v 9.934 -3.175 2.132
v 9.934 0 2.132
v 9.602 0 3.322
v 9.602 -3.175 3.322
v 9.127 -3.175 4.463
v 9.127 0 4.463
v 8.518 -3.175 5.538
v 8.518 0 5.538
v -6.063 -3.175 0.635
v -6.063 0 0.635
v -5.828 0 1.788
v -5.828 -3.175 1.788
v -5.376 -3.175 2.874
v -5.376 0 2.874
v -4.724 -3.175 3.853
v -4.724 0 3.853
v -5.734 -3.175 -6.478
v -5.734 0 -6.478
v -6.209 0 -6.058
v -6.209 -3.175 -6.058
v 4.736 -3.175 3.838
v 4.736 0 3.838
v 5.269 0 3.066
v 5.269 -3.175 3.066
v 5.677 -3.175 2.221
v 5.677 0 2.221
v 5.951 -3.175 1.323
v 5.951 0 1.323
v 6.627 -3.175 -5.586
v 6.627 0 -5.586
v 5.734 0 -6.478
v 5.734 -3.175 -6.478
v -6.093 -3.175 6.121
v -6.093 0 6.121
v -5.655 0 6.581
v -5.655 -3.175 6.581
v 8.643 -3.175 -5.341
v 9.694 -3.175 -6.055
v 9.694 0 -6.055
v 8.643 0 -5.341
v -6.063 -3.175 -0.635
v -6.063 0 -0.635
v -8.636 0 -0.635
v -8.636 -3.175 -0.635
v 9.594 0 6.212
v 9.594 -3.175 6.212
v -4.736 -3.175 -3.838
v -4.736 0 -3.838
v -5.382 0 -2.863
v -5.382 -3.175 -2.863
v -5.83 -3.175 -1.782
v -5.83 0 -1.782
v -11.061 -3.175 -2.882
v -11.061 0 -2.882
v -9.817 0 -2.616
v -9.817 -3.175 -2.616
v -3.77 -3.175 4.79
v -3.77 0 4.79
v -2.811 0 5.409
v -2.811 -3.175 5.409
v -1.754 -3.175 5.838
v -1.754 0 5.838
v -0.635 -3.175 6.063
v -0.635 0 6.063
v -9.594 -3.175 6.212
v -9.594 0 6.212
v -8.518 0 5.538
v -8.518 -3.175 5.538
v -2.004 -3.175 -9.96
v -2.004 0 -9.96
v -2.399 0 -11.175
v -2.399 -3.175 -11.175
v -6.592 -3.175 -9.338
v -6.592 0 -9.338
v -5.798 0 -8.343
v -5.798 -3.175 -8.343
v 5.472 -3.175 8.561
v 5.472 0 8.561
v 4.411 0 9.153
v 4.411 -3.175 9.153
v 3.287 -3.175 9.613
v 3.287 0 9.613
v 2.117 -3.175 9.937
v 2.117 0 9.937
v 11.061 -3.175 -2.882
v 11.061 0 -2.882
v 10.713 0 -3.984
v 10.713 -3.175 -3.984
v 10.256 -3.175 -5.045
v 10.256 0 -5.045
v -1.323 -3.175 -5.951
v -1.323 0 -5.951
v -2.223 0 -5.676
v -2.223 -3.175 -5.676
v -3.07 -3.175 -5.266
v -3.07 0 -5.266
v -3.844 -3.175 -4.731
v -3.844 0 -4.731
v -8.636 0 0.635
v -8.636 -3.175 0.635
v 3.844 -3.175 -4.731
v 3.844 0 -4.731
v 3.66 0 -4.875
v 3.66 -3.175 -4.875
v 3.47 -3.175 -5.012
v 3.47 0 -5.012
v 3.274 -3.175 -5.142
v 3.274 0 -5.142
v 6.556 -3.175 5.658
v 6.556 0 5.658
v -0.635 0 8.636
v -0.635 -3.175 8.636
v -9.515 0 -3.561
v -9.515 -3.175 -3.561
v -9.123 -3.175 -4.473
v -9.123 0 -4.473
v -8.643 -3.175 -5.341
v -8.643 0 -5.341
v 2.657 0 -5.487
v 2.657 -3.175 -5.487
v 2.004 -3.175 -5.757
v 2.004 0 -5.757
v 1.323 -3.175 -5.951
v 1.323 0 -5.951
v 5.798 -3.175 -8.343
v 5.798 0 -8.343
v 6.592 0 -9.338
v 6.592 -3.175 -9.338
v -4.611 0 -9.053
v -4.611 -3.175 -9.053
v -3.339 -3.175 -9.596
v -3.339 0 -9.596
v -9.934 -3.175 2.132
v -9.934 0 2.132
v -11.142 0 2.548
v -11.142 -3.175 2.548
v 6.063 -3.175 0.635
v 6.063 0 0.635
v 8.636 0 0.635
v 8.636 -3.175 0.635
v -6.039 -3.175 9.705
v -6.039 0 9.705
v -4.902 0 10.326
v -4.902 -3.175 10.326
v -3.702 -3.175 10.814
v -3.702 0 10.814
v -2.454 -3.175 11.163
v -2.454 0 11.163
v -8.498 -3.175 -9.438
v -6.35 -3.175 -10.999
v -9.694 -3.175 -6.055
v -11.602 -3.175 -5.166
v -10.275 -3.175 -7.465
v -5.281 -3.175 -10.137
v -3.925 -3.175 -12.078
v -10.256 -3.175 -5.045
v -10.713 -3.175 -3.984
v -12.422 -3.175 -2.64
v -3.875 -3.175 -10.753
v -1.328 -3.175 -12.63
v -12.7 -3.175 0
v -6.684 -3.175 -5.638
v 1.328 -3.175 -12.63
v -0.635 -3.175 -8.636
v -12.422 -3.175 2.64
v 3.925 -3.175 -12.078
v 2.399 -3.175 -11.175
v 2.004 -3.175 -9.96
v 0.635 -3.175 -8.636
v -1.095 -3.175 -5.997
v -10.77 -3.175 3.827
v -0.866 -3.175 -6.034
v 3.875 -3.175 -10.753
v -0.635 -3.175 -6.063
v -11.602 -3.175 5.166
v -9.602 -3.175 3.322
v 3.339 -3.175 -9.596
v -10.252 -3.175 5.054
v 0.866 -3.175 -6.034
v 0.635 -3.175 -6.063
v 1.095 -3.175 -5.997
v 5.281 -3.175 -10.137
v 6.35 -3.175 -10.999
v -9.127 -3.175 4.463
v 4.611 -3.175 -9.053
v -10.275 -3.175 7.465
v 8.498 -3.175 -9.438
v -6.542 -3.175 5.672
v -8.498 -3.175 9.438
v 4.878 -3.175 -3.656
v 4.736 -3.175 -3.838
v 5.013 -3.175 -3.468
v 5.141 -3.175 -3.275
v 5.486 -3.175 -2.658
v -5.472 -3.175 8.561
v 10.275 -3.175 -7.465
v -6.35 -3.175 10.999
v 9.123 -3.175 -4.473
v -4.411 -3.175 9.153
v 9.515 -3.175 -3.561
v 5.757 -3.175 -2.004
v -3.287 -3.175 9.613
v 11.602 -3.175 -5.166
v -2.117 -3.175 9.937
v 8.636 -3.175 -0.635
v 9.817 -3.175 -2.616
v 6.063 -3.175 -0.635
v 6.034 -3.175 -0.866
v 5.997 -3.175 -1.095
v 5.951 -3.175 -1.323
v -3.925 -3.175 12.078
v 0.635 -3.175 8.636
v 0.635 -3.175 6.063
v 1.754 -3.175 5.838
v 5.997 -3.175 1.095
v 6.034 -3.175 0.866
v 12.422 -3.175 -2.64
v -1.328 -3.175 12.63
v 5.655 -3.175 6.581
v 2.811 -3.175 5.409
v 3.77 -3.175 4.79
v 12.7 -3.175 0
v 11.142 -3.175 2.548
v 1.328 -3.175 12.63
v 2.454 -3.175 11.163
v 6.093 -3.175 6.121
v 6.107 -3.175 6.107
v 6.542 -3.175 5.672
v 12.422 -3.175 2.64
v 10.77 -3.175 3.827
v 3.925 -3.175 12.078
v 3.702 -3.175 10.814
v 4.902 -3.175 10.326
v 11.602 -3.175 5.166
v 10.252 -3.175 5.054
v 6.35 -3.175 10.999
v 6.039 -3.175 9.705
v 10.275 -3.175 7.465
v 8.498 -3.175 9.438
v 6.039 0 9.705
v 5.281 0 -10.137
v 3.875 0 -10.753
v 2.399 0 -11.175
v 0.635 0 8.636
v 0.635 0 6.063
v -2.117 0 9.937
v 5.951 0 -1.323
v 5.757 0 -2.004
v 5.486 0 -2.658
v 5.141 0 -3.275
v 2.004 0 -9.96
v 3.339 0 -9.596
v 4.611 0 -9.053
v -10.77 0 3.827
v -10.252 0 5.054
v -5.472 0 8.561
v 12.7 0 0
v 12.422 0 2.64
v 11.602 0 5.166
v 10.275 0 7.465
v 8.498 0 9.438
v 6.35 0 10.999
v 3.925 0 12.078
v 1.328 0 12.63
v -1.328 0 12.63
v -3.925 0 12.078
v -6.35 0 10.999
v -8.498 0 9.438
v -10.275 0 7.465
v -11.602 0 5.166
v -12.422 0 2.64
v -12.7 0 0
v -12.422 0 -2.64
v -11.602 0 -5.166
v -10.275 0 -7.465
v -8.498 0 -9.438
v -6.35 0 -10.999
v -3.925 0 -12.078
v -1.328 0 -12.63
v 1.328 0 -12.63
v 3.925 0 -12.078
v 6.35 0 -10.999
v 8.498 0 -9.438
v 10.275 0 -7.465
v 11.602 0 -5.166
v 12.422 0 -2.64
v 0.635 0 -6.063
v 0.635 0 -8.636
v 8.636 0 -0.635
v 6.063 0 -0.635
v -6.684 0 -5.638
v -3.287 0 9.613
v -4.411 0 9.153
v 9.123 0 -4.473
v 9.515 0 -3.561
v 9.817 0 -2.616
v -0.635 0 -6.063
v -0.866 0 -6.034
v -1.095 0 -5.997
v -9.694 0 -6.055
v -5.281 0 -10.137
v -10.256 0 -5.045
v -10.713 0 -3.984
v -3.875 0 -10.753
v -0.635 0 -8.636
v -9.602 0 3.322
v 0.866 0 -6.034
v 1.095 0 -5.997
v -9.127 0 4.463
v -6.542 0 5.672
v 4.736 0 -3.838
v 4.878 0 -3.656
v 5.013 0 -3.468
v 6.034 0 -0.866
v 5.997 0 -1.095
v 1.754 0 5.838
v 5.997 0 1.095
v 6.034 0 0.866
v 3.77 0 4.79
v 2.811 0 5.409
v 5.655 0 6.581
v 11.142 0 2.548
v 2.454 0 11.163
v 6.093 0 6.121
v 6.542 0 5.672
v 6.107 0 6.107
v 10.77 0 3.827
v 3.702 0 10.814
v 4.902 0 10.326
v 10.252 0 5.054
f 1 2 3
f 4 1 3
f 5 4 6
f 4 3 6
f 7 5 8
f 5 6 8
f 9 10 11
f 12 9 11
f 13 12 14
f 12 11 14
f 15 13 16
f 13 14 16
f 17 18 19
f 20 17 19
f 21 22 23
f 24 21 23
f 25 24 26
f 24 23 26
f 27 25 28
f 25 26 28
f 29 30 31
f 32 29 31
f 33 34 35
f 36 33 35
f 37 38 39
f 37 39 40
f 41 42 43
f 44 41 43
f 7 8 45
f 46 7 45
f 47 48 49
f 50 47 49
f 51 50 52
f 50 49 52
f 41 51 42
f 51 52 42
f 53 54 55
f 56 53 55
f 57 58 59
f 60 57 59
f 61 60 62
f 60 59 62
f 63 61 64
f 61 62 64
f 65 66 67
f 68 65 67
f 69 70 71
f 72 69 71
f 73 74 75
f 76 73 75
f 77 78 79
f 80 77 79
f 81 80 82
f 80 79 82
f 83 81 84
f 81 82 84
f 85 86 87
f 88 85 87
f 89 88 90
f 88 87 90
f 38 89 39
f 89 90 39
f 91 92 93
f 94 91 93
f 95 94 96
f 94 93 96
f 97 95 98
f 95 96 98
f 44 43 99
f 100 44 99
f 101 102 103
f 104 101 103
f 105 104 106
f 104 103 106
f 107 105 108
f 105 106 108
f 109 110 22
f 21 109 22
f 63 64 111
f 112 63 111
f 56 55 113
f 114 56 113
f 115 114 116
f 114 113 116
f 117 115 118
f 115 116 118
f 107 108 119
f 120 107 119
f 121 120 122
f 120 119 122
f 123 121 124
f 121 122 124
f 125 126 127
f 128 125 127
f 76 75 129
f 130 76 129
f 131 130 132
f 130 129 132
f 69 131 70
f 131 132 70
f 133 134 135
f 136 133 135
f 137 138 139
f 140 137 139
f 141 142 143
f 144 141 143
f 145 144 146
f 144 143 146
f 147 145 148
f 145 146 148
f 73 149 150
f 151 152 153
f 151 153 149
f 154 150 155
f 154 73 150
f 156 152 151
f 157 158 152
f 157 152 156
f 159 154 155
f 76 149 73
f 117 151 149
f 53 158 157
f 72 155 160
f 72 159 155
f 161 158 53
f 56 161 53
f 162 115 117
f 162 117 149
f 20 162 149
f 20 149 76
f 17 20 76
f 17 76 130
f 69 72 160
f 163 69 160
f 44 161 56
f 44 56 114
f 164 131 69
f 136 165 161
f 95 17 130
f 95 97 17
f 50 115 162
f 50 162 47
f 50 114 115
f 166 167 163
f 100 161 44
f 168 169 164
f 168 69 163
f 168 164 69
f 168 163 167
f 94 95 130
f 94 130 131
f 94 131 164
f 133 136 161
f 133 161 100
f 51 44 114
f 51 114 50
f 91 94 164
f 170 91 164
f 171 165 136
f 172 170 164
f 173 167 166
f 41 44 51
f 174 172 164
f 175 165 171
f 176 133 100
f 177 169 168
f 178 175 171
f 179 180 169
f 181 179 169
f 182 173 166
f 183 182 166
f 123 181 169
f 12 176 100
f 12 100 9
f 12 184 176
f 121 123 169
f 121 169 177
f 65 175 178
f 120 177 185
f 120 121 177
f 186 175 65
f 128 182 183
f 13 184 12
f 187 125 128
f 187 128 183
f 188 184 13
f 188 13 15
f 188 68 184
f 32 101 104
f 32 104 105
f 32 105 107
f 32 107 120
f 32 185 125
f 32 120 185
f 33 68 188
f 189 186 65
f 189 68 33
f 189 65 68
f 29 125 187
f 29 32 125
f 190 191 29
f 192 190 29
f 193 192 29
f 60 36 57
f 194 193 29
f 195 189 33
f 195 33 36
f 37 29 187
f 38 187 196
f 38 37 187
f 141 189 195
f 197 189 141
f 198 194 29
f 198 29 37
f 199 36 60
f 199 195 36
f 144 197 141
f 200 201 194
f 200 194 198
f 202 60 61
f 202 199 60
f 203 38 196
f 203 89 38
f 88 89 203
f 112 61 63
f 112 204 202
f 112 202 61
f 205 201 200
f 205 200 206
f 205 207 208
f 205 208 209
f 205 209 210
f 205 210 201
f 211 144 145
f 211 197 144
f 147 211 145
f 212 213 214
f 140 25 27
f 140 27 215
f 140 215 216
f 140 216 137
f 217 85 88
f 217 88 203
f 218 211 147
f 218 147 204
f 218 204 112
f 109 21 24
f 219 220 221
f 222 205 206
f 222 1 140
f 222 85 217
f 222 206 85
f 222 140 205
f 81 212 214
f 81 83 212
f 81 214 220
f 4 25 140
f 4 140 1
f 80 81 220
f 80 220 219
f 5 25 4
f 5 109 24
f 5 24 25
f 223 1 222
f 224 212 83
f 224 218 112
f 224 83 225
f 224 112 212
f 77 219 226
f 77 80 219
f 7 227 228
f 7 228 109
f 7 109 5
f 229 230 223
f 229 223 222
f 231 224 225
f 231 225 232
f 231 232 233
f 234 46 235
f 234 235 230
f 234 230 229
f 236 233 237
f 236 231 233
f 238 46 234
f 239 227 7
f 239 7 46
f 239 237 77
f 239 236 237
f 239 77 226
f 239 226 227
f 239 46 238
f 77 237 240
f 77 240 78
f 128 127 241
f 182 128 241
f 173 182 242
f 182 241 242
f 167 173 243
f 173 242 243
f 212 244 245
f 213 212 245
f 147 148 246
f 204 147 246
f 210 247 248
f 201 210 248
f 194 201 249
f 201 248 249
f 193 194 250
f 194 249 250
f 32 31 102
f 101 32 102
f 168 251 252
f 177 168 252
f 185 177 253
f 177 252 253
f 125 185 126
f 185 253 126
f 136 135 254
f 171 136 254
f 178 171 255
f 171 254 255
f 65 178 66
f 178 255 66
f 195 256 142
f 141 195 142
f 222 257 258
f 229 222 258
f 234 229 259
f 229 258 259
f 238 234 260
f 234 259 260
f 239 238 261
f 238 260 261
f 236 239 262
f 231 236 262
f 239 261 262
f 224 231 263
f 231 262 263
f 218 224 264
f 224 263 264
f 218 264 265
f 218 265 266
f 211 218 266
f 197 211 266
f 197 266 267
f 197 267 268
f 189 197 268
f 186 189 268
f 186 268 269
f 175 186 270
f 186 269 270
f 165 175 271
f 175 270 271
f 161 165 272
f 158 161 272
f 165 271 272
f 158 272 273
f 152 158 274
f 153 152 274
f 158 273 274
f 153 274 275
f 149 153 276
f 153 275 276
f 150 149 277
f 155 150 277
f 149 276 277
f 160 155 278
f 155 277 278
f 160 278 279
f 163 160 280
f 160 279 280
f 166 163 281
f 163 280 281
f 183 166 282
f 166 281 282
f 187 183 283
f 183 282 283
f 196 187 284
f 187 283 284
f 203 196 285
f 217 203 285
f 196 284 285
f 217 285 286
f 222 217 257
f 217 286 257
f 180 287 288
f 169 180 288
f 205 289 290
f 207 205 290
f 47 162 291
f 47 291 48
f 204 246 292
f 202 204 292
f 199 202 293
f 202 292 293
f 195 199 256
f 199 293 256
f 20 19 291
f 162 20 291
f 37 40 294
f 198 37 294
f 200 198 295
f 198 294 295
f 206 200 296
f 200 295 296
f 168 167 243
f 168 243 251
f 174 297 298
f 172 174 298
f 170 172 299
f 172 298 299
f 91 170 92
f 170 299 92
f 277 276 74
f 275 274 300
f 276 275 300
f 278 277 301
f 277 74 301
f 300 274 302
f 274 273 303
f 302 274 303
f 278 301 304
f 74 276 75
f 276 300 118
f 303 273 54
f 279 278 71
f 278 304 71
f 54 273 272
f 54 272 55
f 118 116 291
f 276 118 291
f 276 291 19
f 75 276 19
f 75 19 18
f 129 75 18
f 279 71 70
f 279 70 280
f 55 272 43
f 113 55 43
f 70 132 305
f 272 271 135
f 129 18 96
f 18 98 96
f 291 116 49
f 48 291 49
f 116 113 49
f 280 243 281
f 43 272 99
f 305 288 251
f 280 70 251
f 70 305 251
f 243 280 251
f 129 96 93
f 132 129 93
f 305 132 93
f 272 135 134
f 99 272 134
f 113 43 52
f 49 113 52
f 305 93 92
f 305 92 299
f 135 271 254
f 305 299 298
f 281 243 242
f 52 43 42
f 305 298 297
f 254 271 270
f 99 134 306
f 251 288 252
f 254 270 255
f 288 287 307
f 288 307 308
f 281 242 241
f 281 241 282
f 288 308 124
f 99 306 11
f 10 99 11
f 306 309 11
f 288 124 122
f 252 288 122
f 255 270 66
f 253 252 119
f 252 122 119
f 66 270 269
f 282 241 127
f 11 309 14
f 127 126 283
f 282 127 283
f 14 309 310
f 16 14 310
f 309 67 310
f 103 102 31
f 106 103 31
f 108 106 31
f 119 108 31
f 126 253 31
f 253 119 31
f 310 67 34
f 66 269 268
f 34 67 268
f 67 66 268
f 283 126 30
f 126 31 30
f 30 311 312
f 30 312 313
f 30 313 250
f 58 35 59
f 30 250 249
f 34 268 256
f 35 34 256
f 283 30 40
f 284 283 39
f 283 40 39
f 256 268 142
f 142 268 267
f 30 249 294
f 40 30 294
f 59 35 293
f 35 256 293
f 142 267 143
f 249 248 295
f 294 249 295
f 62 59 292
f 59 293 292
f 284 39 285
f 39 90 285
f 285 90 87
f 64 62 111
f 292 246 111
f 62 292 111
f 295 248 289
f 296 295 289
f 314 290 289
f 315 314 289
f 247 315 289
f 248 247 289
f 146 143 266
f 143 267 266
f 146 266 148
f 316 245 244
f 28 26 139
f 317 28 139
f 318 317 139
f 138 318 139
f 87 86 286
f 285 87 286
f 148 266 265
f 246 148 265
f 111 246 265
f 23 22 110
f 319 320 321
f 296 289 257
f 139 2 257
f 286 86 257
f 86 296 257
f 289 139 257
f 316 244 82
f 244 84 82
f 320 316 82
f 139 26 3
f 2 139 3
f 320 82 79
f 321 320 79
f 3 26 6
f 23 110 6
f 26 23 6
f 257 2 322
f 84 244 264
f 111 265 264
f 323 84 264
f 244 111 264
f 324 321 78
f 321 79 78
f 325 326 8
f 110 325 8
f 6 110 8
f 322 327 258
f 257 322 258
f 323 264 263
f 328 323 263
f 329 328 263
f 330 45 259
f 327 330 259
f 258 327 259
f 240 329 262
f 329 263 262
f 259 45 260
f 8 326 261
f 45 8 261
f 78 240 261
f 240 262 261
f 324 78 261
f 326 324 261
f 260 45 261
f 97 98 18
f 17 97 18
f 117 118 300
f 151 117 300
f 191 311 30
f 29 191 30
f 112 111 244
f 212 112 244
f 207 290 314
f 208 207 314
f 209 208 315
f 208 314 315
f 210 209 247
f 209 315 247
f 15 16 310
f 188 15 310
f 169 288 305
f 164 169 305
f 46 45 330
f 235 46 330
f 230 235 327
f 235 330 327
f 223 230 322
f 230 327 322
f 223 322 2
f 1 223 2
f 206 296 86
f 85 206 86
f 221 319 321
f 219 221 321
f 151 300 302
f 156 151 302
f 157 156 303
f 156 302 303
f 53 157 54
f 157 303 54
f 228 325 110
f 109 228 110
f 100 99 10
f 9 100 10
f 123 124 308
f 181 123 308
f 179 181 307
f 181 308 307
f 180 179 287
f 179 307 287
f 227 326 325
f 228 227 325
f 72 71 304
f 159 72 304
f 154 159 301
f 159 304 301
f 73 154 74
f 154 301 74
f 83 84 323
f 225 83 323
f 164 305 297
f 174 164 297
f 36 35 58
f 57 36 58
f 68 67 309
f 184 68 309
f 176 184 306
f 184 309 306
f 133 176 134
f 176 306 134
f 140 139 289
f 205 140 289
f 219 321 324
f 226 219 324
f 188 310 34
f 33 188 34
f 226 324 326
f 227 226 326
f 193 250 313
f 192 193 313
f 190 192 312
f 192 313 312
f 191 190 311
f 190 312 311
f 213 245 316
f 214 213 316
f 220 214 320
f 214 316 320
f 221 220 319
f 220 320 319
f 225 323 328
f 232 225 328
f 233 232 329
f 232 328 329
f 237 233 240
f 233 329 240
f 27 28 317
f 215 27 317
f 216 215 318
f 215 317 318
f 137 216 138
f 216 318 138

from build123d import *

# Parameters (mm, degrees)
F0_R     = 12.7
F1_DEPTH = 3.175


# Not quite as in the source:
# - ends of sketch curves that miss each other by under 0.0002 mm in the source are joined


with BuildPart() as f1:
    # F0 (on Front) → F1 (new body)
    with BuildSketch(Plane.XZ):
        Circle(F0_R)
        with BuildLine():
            ThreePointArc((11.1424209807, 2.5478137078), (11.3578777025, 1.2819961371), (11.43, 0))
            ThreePointArc((11.43, 0), (11.3372924765, -1.4528245947), (11.0606737878, -2.8820817755))
            ThreePointArc((11.0606737878, -2.8820817755), (10.498054115, -4.5205928591), (9.694266327, -6.0552539485))
            ThreePointArc((9.694266327, -6.0552539485), (8.3067678362, -7.8512742988), (6.5917644701, -9.3377481852))
            ThreePointArc((6.5917644701, -9.3377481852), (4.5881966593, -10.4686843212), (2.3987302505, -11.1754638913))
            ThreePointArc((2.3987302505, -11.1754638913), (0, -11.43), (-2.3987302505, -11.1754638913))
            ThreePointArc((-2.3987302505, -11.1754638913), (-4.5881966593, -10.4686843212), (-6.5917644701, -9.3377481852))
            ThreePointArc((-6.5917644701, -9.3377481852), (-8.3067678362, -7.8512742988), (-9.694266327, -6.0552539485))
            ThreePointArc((-9.694266327, -6.0552539485), (-10.498054115, -4.5205928591), (-11.0606737878, -2.8820817755))
            ThreePointArc((-11.0606737878, -2.8820817755), (-11.4287048944, -0.1720593972), (-11.1424209807, 2.5478137078))
            ThreePointArc((-11.1424209807, 2.5478137078), (-10.5290706386, 4.4478726922), (-9.5944423354, 6.2122118663))
            ThreePointArc((-9.5944423354, 6.2122118663), (-8.0092161617, 8.1545911286), (-6.0386388222, 9.7046247313))
            ThreePointArc((-6.0386388222, 9.7046247313), (-4.3084616277, 10.5868814295), (-2.4538934823, 11.1634809436))
            ThreePointArc((-2.4538934823, 11.1634809436), (0, 11.43), (2.4538934823, 11.1634809436))
            ThreePointArc((2.4538934823, 11.1634809436), (4.3084616277, 10.5868814295), (6.0386388222, 9.7046247313))
            ThreePointArc((6.0386388222, 9.7046247313), (8.0092161617, 8.1545911286), (9.5944423354, 6.2122118663))
            ThreePointArc((9.5944423354, 6.2122118663), (10.5290706386, 4.4478726922), (11.1424209807, 2.5478137078))
        make_face(mode=Mode.SUBTRACT)
        with BuildLine():
            ThreePointArc((10.16, 0), (10.10329164, 1.0719599045), (9.933799599, 2.1319534531))
            ThreePointArc((9.933799599, 2.1319534531), (9.3818599064, 3.8995262145), (8.5182733268, 5.5375644041))
            ThreePointArc((8.5182733268, 5.5375644041), (7.1564472405, 7.2118557178), (5.4717026611, 8.5607283562))
            ThreePointArc((5.4717026611, 8.5607283562), (3.8560932614, 9.3997949318), (2.1166776906, 9.9370657417))
            ThreePointArc((2.1166776906, 9.9370657417), (0, 10.16), (-2.1166776906, 9.9370657417))
            ThreePointArc((-2.1166776906, 9.9370657417), (-3.8560932614, 9.3997949318), (-5.4717026611, 8.5607283562))
            ThreePointArc((-5.4717026611, 8.5607283562), (-7.1564472405, 7.2118557178), (-8.5182733268, 5.5375644041))
            ThreePointArc((-8.5182733268, 5.5375644041), (-9.3818599064, 3.8995262145), (-9.933799599, 2.1319534531))
            ThreePointArc((-9.933799599, 2.1319534531), (-10.1569477884, -0.2490213305), (-9.817387512, -2.6162))
            ThreePointArc((-9.817387512, -2.6162), (-9.3301072422, -4.0217780707), (-8.6427953563, -5.3411317555))
            ThreePointArc((-8.6427953563, -5.3411317555), (-7.3747174058, -6.9885007824), (-5.7978750028, -8.343275463))
            ThreePointArc((-5.7978750028, -8.343275463), (-3.9840291181, -9.3462886744), (-2.0043747759, -9.9603253841))
            ThreePointArc((-2.0043747759, -9.9603253841), (0, -10.16), (2.0043747759, -9.9603253841))
            ThreePointArc((2.0043747759, -9.9603253841), (3.9840291181, -9.3462886744), (5.7978750028, -8.343275463))
            ThreePointArc((5.7978750028, -8.343275463), (7.3747174058, -6.9885007824), (8.6427953563, -5.3411317555))
            ThreePointArc((8.6427953563, -5.3411317555), (9.3301072422, -4.0217780707), (9.817387512, -2.6162))
            ThreePointArc((9.817387512, -2.6162), (10.0739827556, -1.3192692823), (10.16, 0))
        make_face()
        with BuildLine():
            ThreePointArc((4.7360858752, 3.8380602631), (5.4892872515, 2.6512150932), (5.9506155559, 1.323401113))
            Line((5.9506155559, 1.323401113), (8.636, 1.323401113))
            Line((8.636, 1.323401113), (8.636, 0.635))
            Line((8.636, 0.635), (8.636, 0))
            Line((8.636, 0), (8.636, -0.635))
            Line((8.636, -0.635), (8.636, -1.323401113))
            Line((8.636, -1.323401113), (5.9506155559, -1.323401113))
            ThreePointArc((5.9506155559, -1.323401113), (5.6312135784, -2.3346626382), (5.1413854537, -3.2752666482))
            Line((5.1413854537, -3.2752666482), (7.0945855376, -5.080295188))
            Line((7.0945855376, -5.080295188), (6.6273668913, -5.5858669721))
            Line((6.6273668913, -5.5858669721), (5.7343752763, -6.4777944262))
            Line((5.7343752763, -6.4777944262), (5.2671687856, -6.9833774435))
            Line((5.2671687856, -6.9833774435), (3.2744427263, -5.1419102319))
            ThreePointArc((3.2744427263, -5.1419102319), (2.3342114446, -5.631400619), (1.323401113, -5.9506155559))
            Line((1.323401113, -5.9506155559), (1.323401113, -8.636))
            Line((1.323401113, -8.636), (0.635, -8.636))
            Line((0.635, -8.636), (0, -8.636))
            Line((0, -8.636), (-0.635, -8.636))
            Line((-0.635, -8.636), (-1.323401113, -8.636))
            Line((-1.323401113, -8.636), (-1.323401113, -5.9506155559))
            ThreePointArc((-1.323401113, -5.9506155559), (-2.6547777921, -5.4875651135), (-3.8442056919, -4.7310990899))
            Line((-3.8442056919, -4.7310990899), (-5.7343752763, -6.4777944262))
            Line((-5.7343752763, -6.4777944262), (-6.2091766623, -6.0579455764))
            Line((-6.2091766623, -6.0579455764), (-6.6839780483, -5.6380967267))
            Line((-6.6839780483, -5.6380967267), (-4.7360858752, -3.8380602631))
            ThreePointArc((-4.7360858752, -3.8380602631), (-5.6319696302, -2.3328382037), (-6.0628368772, -0.635))
            Line((-6.0628368772, -0.635), (-8.636, -0.635))
            Line((-8.636, -0.635), (-8.636, 0))
            Line((-8.636, 0), (-8.636, 0.635))
            Line((-8.636, 0.635), (-6.0628368772, 0.635))
            ThreePointArc((-6.0628368772, 0.635), (-5.6281633501, 2.3420062564), (-4.7235609165, 3.8534644501))
            Line((-4.7235609165, 3.8534644501), (-6.5416064283, 5.671509962))
            Line((-6.5416064283, 5.671509962), (-6.0925936223, 6.120522768))
            Line((-6.0925936223, 6.120522768), (-5.6552171182, 6.5808778416))
            Line((-5.6552171182, 6.5808778416), (-3.7703908438, 4.7901324496))
            ThreePointArc((-3.7703908438, 4.7901324496), (-2.2927737049, 5.6483984224), (-0.635, 6.0628368772))
            Line((-0.635, 6.0628368772), (-0.635, 8.636))
            Line((-0.635, 8.636), (0, 8.636))
            Line((0, 8.636), (0.635, 8.636))
            Line((0.635, 8.636), (0.635, 6.0628368772))
            ThreePointArc((0.635, 6.0628368772), (2.2927737049, 5.6483984224), (3.7703908438, 4.7901324496))
            Line((3.7703908438, 4.7901324496), (5.6552171182, 6.5808778416))
            Line((5.6552171182, 6.5808778416), (6.0925936223, 6.120522768))
            Line((6.0925936223, 6.120522768), (6.1065741623, 6.1065741623))
            Line((6.1065741623, 6.1065741623), (6.5416223955, 5.6715259292))
            Line((6.5416223955, 5.6715259292), (6.5555869684, 5.6575613563))
            Line((6.5555869684, 5.6575613563), (4.7360858752, 3.8380602631))
        make_face(mode=Mode.SUBTRACT)
        with BuildLine():
            ThreePointArc((11.0606737878, -2.8820817755), (11.3372924765, -1.4528245947), (11.43, 0))
            ThreePointArc((11.43, 0), (11.3578777025, 1.2819961371), (11.1424209807, 2.5478137078))
            Line((11.1424209807, 2.5478137078), (9.933799599, 2.1319534531))
            ThreePointArc((9.933799599, 2.1319534531), (10.10329164, 1.0719599045), (10.16, 0))
            ThreePointArc((10.16, 0), (10.0739827556, -1.3192692823), (9.817387512, -2.6162))
            Line((9.817387512, -2.6162), (11.0606737878, -2.8820817755))
        make_face()
        with BuildLine():
            Line((-9.933799599, 2.1319534531), (-11.1424209807, 2.5478137078))
            ThreePointArc((-11.1424209807, 2.5478137078), (-11.4287048944, -0.1720593972), (-11.0606737878, -2.8820817755))
            Line((-11.0606737878, -2.8820817755), (-9.817387512, -2.6162))
            ThreePointArc((-9.817387512, -2.6162), (-10.1569477884, -0.2490213305), (-9.933799599, 2.1319534531))
        make_face()
        with BuildLine():
            Line((-5.4717026611, 8.5607283562), (-6.0386388222, 9.7046247313))
            ThreePointArc((-6.0386388222, 9.7046247313), (-8.0092161617, 8.1545911286), (-9.5944423354, 6.2122118663))
            Line((-9.5944423354, 6.2122118663), (-8.5182733268, 5.5375644041))
            ThreePointArc((-8.5182733268, 5.5375644041), (-7.1564472405, 7.2118557178), (-5.4717026611, 8.5607283562))
        make_face()
        with BuildLine():
            Line((8.5182733268, 5.5375644041), (9.5944423354, 6.2122118663))
            ThreePointArc((9.5944423354, 6.2122118663), (8.0092161617, 8.1545911286), (6.0386388222, 9.7046247313))
            Line((6.0386388222, 9.7046247313), (5.4717026611, 8.5607283562))
            ThreePointArc((5.4717026611, 8.5607283562), (7.1564472405, 7.2118557178), (8.5182733268, 5.5375644041))
        make_face()
        with BuildLine():
            Line((2.1166776906, 9.9370657417), (2.4538934823, 11.1634809436))
            ThreePointArc((2.4538934823, 11.1634809436), (0, 11.43), (-2.4538934823, 11.1634809436))
            Line((-2.4538934823, 11.1634809436), (-2.1166776906, 9.9370657417))
            ThreePointArc((-2.1166776906, 9.9370657417), (0, 10.16), (2.1166776906, 9.9370657417))
        make_face()
        with BuildLine():
            ThreePointArc((-2.3987302505, -11.1754638913), (0, -11.43), (2.3987302505, -11.1754638913))
            Line((2.3987302505, -11.1754638913), (2.0043747759, -9.9603253841))
            ThreePointArc((2.0043747759, -9.9603253841), (0, -10.16), (-2.0043747759, -9.9603253841))
            Line((-2.0043747759, -9.9603253841), (-2.3987302505, -11.1754638913))
        make_face()
        with BuildLine():
            ThreePointArc((6.5917644701, -9.3377481852), (8.3067678362, -7.8512742988), (9.694266327, -6.0552539485))
            Line((9.694266327, -6.0552539485), (8.6427953563, -5.3411317555))
            ThreePointArc((8.6427953563, -5.3411317555), (7.3747174058, -6.9885007824), (5.7978750028, -8.343275463))
            Line((5.7978750028, -8.343275463), (6.5917644701, -9.3377481852))
        make_face()
        with BuildLine():
            ThreePointArc((-9.694266327, -6.0552539485), (-8.3067678362, -7.8512742988), (-6.5917644701, -9.3377481852))
            Line((-6.5917644701, -9.3377481852), (-5.7978750028, -8.343275463))
            ThreePointArc((-5.7978750028, -8.343275463), (-7.3747174058, -6.9885007824), (-8.6427953563, -5.3411317555))
            Line((-8.6427953563, -5.3411317555), (-9.694266327, -6.0552539485))
        make_face()
        with BuildLine():
            Line((5.7343752763, -6.4777944262), (3.8442056919, -4.7310990899))
            ThreePointArc((3.8442056919, -4.7310990899), (3.565246173, -4.9447179623), (3.2744427263, -5.1419102319))
            Line((3.2744427263, -5.1419102319), (5.2671687856, -6.9833774435))
            Line((5.2671687856, -6.9833774435), (5.7343752763, -6.4777944262))
        make_face()
        with BuildLine():
            Line((1.323401113, -8.636), (1.323401113, -5.9506155559))
            ThreePointArc((1.323401113, -5.9506155559), (0.9808068801, -6.0165799142), (0.635, -6.0628368772))
            Line((0.635, -6.0628368772), (0.635, -8.636))
            Line((0.635, -8.636), (1.323401113, -8.636))
        make_face()
        with BuildLine():
            Line((-0.635, -8.636), (-0.635, -6.0628368772))
            ThreePointArc((-0.635, -6.0628368772), (-0.9808068801, -6.0165799142), (-1.323401113, -5.9506155559))
            Line((-1.323401113, -5.9506155559), (-1.323401113, -8.636))
            Line((-1.323401113, -8.636), (-0.635, -8.636))
        make_face()
        with BuildLine():
            Line((8.636, -0.635), (6.0628368772, -0.635))
            ThreePointArc((6.0628368772, -0.635), (6.0165799142, -0.9808068801), (5.9506155559, -1.323401113))
            Line((5.9506155559, -1.323401113), (8.636, -1.323401113))
            Line((8.636, -1.323401113), (8.636, -0.635))
        make_face()
        with BuildLine():
            ThreePointArc((5.9506155559, 1.323401113), (6.0165799142, 0.9808068801), (6.0628368772, 0.635))
            Line((6.0628368772, 0.635), (8.636, 0.635))
            Line((8.636, 0.635), (8.636, 1.323401113))
            Line((8.636, 1.323401113), (5.9506155559, 1.323401113))
        make_face()
        with BuildLine():
            Line((7.0945855376, -5.080295188), (5.1413854537, -3.2752666482))
            ThreePointArc((5.1413854537, -3.2752666482), (4.9467458118, -3.5624320167), (4.7360858752, -3.8380602631))
            Line((4.7360858752, -3.8380602631), (6.6273668913, -5.5858669721))
            Line((6.6273668913, -5.5858669721), (7.0945855376, -5.080295188))
        make_face()
    extrude(amount=F1_DEPTH)


solid = f1.part
